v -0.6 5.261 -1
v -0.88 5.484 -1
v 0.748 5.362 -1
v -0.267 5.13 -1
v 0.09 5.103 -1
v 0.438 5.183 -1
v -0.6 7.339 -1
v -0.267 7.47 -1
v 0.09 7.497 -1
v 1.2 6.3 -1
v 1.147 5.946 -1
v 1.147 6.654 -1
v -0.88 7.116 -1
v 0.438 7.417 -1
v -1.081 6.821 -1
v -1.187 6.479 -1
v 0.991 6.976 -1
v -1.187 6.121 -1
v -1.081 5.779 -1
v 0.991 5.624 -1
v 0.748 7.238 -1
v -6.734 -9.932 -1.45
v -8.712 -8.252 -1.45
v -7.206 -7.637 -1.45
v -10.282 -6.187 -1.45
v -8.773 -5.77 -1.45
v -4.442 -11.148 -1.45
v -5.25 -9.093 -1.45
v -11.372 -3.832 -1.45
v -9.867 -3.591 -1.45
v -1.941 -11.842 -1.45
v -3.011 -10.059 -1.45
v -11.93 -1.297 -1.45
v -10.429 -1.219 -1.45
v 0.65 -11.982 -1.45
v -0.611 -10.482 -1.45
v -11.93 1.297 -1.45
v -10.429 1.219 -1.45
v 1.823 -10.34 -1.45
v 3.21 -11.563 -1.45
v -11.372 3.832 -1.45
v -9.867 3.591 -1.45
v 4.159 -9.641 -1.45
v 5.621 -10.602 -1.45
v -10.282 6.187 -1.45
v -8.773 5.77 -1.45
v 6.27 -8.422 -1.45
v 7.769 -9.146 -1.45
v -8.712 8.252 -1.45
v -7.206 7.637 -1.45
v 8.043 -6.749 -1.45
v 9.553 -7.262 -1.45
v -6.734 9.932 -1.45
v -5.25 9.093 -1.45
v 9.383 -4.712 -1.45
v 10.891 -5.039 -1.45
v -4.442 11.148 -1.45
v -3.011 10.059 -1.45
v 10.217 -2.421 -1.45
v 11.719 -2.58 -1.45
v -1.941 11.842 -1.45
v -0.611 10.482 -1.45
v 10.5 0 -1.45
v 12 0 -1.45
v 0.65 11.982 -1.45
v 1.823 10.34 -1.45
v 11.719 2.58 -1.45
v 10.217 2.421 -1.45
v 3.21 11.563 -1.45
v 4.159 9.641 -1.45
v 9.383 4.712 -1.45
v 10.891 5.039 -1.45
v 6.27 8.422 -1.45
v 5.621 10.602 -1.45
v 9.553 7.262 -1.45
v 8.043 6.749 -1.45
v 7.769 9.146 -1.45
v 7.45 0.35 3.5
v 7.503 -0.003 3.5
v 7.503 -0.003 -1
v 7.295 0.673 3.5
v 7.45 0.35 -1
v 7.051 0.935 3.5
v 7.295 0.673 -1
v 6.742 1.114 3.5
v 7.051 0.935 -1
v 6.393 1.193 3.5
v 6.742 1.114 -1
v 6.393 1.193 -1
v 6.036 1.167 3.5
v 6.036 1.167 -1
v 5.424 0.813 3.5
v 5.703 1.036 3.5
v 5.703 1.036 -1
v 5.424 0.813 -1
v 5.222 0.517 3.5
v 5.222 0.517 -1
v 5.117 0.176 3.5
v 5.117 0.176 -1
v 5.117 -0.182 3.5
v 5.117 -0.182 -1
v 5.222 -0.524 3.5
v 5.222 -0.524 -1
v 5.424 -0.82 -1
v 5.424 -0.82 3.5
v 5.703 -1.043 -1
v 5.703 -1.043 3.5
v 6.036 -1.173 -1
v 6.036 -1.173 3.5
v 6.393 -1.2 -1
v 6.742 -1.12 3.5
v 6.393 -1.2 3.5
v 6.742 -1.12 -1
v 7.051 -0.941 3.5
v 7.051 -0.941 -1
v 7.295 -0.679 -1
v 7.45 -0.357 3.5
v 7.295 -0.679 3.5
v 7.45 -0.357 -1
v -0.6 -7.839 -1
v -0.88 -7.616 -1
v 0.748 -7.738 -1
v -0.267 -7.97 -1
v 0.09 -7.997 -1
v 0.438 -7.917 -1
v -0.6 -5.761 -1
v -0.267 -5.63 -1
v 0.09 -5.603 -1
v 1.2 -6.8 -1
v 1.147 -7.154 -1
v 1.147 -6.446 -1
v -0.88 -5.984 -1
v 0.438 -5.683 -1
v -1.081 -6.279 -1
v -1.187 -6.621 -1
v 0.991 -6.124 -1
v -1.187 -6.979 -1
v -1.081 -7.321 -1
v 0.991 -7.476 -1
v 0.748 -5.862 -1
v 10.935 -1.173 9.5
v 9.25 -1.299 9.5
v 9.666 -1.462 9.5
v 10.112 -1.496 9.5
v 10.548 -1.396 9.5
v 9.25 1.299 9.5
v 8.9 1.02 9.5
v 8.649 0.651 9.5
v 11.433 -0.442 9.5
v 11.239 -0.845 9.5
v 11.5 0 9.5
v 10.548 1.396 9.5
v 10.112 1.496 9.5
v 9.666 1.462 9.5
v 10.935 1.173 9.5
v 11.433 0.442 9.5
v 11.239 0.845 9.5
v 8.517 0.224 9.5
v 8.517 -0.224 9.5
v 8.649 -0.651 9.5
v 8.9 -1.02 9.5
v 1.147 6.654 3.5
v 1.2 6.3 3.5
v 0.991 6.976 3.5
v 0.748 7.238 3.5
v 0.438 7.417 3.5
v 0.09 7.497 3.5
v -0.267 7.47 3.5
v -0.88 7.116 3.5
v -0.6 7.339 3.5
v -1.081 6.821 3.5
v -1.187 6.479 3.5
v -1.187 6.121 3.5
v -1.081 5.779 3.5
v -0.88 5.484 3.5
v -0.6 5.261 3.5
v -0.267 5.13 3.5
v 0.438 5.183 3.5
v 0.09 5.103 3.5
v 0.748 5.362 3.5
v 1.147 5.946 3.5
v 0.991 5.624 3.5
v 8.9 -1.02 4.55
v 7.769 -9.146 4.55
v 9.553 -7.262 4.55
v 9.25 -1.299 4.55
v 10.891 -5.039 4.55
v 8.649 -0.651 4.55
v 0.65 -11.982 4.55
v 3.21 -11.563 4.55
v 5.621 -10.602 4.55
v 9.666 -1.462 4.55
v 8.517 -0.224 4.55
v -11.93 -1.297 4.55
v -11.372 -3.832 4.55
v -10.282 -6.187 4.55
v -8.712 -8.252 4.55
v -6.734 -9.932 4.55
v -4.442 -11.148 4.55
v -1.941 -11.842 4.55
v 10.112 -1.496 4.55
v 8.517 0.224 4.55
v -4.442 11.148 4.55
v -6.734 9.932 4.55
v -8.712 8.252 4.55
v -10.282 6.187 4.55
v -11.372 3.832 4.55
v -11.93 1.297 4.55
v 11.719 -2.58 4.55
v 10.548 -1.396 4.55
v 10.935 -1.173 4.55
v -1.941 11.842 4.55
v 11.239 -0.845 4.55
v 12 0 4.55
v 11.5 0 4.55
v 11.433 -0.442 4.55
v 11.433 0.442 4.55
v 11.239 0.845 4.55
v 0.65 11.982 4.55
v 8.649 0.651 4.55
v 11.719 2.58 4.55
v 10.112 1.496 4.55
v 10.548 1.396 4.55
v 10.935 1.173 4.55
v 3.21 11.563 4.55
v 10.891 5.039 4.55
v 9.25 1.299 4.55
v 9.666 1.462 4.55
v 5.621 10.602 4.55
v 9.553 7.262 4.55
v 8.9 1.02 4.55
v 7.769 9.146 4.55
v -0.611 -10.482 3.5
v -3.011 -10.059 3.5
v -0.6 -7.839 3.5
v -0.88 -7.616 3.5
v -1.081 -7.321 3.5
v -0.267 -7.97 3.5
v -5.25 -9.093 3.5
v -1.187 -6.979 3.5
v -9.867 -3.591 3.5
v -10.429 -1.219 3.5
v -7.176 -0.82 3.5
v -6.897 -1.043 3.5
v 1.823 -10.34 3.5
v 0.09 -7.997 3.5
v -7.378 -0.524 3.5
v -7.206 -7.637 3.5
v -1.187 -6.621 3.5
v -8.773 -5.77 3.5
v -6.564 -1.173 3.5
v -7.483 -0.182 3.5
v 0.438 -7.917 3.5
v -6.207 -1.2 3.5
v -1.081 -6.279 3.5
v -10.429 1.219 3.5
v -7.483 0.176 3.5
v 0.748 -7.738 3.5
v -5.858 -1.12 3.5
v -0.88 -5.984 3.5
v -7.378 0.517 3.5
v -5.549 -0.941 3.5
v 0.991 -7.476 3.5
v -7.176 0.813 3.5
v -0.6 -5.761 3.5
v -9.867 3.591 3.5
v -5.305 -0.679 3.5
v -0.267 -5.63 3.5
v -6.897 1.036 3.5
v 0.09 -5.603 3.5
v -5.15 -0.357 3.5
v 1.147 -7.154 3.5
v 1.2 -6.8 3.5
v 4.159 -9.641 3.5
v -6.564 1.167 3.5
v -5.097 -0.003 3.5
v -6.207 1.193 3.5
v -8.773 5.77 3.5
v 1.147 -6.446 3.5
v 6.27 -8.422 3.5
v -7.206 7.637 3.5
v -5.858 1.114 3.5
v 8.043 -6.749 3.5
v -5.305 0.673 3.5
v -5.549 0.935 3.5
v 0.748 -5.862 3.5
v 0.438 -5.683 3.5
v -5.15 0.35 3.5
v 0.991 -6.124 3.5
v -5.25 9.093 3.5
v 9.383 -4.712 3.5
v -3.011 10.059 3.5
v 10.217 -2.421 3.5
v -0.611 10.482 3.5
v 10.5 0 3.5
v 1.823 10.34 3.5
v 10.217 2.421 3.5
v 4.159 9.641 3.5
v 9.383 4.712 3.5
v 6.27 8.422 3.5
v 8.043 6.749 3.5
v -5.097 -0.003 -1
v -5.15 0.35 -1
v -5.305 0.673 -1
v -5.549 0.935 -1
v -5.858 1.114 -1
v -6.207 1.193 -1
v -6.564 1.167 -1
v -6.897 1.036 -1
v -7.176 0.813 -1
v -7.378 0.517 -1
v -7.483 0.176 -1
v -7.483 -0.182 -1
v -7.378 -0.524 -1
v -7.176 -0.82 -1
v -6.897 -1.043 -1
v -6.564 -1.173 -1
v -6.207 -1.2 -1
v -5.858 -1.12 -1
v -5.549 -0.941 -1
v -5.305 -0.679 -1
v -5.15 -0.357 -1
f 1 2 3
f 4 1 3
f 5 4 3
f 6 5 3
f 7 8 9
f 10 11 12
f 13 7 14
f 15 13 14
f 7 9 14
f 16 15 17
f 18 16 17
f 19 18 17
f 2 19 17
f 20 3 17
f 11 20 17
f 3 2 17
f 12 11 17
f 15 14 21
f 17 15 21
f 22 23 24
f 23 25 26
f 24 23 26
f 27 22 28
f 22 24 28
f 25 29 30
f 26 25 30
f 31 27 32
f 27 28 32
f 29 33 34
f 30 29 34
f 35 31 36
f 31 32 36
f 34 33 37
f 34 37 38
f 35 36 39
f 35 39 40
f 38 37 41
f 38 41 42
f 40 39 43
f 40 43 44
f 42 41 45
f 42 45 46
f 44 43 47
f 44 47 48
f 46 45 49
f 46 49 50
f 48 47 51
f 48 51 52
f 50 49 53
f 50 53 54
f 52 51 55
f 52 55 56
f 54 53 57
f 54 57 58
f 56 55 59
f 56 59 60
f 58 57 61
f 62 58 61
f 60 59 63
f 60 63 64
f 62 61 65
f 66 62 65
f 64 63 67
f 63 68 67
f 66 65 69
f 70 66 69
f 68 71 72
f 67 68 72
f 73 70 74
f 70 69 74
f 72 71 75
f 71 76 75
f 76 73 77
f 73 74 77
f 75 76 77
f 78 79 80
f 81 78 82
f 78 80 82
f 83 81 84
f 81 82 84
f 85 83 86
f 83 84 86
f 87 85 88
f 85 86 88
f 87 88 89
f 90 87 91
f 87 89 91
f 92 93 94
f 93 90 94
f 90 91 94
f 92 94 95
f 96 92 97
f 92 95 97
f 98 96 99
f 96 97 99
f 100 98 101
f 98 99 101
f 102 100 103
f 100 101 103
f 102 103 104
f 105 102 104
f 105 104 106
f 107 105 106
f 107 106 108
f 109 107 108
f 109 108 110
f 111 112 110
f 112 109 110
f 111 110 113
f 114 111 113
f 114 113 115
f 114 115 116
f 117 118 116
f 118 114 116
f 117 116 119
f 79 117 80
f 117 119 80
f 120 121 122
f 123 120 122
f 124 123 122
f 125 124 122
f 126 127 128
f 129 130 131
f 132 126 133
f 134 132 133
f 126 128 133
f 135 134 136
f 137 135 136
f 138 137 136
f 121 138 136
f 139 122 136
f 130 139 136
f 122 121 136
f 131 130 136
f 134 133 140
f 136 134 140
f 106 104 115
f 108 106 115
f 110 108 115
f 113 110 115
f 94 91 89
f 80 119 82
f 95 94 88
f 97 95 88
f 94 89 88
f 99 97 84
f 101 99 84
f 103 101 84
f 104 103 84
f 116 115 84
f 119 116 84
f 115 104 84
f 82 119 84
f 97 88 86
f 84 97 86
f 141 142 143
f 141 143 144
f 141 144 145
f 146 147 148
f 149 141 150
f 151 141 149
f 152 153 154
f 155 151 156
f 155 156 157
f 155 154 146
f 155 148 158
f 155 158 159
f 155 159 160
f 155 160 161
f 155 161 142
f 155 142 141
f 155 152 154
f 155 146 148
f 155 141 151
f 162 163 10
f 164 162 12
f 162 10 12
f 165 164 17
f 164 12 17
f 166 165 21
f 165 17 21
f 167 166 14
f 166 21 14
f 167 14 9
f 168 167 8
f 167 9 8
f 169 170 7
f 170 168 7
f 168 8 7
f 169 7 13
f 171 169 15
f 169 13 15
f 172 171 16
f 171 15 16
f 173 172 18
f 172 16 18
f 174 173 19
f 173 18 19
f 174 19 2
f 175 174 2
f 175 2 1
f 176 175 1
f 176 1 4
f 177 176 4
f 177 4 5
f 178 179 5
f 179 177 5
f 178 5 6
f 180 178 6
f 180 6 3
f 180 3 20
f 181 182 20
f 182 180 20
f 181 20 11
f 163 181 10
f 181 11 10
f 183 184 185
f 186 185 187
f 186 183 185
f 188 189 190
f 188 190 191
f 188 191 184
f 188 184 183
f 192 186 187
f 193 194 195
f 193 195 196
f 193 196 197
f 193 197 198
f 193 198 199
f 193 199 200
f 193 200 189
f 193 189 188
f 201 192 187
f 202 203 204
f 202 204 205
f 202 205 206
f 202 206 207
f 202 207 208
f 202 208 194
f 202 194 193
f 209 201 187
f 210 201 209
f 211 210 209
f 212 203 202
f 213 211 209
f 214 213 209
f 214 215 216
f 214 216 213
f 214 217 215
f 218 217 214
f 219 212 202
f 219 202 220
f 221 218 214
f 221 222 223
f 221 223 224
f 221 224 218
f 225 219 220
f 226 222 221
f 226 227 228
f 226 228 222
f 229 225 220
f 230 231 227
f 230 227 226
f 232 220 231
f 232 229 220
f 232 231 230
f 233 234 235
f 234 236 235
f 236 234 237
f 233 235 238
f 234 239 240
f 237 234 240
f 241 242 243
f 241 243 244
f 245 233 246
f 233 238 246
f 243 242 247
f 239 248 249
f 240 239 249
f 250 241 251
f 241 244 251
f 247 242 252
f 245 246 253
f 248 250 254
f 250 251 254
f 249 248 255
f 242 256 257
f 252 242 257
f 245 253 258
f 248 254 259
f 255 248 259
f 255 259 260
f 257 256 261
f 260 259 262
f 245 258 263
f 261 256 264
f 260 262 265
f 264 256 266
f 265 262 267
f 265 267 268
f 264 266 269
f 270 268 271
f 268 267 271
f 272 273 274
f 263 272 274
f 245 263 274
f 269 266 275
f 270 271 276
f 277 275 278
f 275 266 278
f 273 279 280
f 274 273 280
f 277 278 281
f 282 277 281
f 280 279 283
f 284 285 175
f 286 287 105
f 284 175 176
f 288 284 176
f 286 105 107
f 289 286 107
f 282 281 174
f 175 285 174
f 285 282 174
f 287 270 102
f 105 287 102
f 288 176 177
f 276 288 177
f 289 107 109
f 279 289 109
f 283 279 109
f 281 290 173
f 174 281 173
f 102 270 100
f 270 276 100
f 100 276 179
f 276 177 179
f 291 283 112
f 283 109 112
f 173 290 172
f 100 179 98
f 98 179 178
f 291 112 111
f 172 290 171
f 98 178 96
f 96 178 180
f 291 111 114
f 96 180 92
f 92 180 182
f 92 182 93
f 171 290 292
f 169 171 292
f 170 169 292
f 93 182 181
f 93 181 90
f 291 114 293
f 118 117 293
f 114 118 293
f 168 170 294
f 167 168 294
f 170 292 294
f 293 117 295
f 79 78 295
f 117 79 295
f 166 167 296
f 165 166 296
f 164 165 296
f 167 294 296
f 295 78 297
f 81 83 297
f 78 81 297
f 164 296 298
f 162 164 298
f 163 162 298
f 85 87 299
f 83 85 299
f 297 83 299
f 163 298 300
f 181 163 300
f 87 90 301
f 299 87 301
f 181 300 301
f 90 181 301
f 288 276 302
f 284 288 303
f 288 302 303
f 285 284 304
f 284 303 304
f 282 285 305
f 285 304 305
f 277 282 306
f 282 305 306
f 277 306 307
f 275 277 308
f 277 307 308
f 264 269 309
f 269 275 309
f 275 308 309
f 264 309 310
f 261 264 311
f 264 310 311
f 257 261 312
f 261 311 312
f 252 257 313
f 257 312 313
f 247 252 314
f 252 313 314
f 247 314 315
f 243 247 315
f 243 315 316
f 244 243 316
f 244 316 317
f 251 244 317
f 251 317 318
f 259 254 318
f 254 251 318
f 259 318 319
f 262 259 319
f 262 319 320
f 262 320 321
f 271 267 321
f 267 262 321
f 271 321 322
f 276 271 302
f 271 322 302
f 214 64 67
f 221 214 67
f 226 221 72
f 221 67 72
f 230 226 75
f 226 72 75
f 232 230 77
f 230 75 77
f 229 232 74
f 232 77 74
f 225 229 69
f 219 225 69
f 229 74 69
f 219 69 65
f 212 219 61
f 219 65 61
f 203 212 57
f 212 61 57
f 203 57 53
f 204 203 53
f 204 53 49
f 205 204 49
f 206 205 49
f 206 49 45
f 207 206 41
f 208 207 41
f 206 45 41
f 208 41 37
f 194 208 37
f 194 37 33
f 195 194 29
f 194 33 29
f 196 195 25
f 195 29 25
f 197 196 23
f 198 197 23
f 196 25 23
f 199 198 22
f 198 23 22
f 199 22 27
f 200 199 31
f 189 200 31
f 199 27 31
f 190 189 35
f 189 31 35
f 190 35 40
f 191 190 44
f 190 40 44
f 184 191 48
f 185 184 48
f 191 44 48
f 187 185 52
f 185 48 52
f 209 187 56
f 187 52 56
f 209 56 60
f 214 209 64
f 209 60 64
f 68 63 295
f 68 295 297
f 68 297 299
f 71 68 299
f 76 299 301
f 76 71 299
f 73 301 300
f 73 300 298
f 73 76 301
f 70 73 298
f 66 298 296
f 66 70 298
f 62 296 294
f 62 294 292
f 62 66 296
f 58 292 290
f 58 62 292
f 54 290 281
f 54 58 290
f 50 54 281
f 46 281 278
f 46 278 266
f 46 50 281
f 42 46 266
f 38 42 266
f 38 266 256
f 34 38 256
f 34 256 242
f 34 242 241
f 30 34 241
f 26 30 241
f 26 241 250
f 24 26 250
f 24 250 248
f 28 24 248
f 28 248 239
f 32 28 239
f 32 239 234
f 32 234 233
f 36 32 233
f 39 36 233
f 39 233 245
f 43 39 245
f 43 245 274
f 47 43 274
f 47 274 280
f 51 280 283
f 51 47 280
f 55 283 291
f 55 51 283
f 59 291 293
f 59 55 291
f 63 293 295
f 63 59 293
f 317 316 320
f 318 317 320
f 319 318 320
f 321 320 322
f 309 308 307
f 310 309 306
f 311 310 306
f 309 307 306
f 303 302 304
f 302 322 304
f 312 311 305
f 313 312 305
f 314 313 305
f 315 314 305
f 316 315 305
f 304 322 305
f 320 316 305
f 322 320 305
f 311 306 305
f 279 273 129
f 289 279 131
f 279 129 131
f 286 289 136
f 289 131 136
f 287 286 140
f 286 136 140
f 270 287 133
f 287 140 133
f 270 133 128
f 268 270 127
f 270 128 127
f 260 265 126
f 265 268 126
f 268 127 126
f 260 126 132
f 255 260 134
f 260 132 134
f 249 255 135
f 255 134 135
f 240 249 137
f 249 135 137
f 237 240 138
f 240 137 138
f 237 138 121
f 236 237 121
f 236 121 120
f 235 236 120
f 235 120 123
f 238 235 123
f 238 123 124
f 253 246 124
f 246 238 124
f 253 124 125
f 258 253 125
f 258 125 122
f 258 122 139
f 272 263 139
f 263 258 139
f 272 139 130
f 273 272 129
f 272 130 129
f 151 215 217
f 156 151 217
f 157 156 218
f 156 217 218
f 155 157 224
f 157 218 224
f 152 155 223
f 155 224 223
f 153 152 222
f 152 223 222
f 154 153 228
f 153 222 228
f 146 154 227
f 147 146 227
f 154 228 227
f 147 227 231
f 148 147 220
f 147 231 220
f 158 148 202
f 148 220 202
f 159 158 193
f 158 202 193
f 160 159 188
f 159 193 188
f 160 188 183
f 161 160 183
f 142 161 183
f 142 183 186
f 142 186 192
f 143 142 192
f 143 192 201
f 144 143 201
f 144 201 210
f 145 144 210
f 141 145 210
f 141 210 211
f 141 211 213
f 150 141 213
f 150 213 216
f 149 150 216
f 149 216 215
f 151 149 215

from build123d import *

# Parameters (mm, degrees)
CYLINDER032_R     = 1.5
CYLINDER032_DEPTH = 5.2
CYLINDER026_R     = 1.2
CYLINDER026_DEPTH = 4.8
CYLINDER028_R     = 1.2
CYLINDER028_DEPTH = 4.8
CYLINDER024_R     = 1.2
CYLINDER024_DEPTH = 4.8
CYLINDER031_R     = 1.2
CYLINDER031_DEPTH = 4.8
CYLINDER023_R     = 10.5
CYLINDER023_DEPTH = 5
CYLINDER022_R     = 12
CYLINDER022_DEPTH = 6


with BuildPart() as cylinder032:
    # Cylinder032 → Cylinder032 (new body)
    with BuildSketch(Plane(origin=(10, 0, 4.3), x_dir=(1, 0, 0), z_dir=(0, 0, 1))):
        Circle(CYLINDER032_R)
    extrude(amount=CYLINDER032_DEPTH)


with BuildPart() as cylinder026:
    # Cylinder026 → Cylinder026 (new body)
    with BuildSketch(Plane(origin=(0, -6.8, -1), x_dir=(1, 0, 0), z_dir=(0, 0, 1))):
        Circle(CYLINDER026_R)
    extrude(amount=CYLINDER026_DEPTH)


with BuildPart() as cylinder028:
    # Cylinder028 → Cylinder028 (new body)
    with BuildSketch(Plane(origin=(6.303301, -0.003301, -1), x_dir=(1, 0, 0), z_dir=(0, 0, 1))):
        Circle(CYLINDER028_R)
    extrude(amount=CYLINDER028_DEPTH)


with BuildPart() as cylinder024:
    # Cylinder024 → Cylinder024 (new body)
    with BuildSketch(Plane(origin=(0, 6.3, -1), x_dir=(1, 0, 0), z_dir=(0, 0, 1))):
        Circle(CYLINDER024_R)
    extrude(amount=CYLINDER024_DEPTH)


with BuildPart() as cylinder031:
    # Cylinder031 → Cylinder031 (new body)
    with BuildSketch(Plane(origin=(-6.296699, -0.003301, -1), x_dir=(1, 0, 0), z_dir=(0, 0, 1))):
        Circle(CYLINDER031_R)
    extrude(amount=CYLINDER031_DEPTH)


with BuildPart() as cylinder023:
    # Cylinder023 → Cylinder023 (new body)
    with BuildSketch(Plane.XY.offset(-1.5)):
        Circle(CYLINDER023_R)
    extrude(amount=CYLINDER023_DEPTH)


with BuildPart() as fusion008:
    # Cylinder022 → Cylinder022 (new body)
    with BuildSketch(Plane.XY.offset(-1.45)):
        Circle(CYLINDER022_R)
    extrude(amount=CYLINDER022_DEPTH)

    # Cut014: cut Cylinder023
    add(cylinder023.part, mode=Mode.SUBTRACT)

    # Fusion007: union Cylinder026, Cylinder028, Cylinder024, Cylinder031
    add(cylinder026.part)
    add(cylinder028.part)
    add(cylinder024.part)
    add(cylinder031.part)

    # Fusion008: union Cylinder032
    add(cylinder032.part)


solid = fusion008.part
